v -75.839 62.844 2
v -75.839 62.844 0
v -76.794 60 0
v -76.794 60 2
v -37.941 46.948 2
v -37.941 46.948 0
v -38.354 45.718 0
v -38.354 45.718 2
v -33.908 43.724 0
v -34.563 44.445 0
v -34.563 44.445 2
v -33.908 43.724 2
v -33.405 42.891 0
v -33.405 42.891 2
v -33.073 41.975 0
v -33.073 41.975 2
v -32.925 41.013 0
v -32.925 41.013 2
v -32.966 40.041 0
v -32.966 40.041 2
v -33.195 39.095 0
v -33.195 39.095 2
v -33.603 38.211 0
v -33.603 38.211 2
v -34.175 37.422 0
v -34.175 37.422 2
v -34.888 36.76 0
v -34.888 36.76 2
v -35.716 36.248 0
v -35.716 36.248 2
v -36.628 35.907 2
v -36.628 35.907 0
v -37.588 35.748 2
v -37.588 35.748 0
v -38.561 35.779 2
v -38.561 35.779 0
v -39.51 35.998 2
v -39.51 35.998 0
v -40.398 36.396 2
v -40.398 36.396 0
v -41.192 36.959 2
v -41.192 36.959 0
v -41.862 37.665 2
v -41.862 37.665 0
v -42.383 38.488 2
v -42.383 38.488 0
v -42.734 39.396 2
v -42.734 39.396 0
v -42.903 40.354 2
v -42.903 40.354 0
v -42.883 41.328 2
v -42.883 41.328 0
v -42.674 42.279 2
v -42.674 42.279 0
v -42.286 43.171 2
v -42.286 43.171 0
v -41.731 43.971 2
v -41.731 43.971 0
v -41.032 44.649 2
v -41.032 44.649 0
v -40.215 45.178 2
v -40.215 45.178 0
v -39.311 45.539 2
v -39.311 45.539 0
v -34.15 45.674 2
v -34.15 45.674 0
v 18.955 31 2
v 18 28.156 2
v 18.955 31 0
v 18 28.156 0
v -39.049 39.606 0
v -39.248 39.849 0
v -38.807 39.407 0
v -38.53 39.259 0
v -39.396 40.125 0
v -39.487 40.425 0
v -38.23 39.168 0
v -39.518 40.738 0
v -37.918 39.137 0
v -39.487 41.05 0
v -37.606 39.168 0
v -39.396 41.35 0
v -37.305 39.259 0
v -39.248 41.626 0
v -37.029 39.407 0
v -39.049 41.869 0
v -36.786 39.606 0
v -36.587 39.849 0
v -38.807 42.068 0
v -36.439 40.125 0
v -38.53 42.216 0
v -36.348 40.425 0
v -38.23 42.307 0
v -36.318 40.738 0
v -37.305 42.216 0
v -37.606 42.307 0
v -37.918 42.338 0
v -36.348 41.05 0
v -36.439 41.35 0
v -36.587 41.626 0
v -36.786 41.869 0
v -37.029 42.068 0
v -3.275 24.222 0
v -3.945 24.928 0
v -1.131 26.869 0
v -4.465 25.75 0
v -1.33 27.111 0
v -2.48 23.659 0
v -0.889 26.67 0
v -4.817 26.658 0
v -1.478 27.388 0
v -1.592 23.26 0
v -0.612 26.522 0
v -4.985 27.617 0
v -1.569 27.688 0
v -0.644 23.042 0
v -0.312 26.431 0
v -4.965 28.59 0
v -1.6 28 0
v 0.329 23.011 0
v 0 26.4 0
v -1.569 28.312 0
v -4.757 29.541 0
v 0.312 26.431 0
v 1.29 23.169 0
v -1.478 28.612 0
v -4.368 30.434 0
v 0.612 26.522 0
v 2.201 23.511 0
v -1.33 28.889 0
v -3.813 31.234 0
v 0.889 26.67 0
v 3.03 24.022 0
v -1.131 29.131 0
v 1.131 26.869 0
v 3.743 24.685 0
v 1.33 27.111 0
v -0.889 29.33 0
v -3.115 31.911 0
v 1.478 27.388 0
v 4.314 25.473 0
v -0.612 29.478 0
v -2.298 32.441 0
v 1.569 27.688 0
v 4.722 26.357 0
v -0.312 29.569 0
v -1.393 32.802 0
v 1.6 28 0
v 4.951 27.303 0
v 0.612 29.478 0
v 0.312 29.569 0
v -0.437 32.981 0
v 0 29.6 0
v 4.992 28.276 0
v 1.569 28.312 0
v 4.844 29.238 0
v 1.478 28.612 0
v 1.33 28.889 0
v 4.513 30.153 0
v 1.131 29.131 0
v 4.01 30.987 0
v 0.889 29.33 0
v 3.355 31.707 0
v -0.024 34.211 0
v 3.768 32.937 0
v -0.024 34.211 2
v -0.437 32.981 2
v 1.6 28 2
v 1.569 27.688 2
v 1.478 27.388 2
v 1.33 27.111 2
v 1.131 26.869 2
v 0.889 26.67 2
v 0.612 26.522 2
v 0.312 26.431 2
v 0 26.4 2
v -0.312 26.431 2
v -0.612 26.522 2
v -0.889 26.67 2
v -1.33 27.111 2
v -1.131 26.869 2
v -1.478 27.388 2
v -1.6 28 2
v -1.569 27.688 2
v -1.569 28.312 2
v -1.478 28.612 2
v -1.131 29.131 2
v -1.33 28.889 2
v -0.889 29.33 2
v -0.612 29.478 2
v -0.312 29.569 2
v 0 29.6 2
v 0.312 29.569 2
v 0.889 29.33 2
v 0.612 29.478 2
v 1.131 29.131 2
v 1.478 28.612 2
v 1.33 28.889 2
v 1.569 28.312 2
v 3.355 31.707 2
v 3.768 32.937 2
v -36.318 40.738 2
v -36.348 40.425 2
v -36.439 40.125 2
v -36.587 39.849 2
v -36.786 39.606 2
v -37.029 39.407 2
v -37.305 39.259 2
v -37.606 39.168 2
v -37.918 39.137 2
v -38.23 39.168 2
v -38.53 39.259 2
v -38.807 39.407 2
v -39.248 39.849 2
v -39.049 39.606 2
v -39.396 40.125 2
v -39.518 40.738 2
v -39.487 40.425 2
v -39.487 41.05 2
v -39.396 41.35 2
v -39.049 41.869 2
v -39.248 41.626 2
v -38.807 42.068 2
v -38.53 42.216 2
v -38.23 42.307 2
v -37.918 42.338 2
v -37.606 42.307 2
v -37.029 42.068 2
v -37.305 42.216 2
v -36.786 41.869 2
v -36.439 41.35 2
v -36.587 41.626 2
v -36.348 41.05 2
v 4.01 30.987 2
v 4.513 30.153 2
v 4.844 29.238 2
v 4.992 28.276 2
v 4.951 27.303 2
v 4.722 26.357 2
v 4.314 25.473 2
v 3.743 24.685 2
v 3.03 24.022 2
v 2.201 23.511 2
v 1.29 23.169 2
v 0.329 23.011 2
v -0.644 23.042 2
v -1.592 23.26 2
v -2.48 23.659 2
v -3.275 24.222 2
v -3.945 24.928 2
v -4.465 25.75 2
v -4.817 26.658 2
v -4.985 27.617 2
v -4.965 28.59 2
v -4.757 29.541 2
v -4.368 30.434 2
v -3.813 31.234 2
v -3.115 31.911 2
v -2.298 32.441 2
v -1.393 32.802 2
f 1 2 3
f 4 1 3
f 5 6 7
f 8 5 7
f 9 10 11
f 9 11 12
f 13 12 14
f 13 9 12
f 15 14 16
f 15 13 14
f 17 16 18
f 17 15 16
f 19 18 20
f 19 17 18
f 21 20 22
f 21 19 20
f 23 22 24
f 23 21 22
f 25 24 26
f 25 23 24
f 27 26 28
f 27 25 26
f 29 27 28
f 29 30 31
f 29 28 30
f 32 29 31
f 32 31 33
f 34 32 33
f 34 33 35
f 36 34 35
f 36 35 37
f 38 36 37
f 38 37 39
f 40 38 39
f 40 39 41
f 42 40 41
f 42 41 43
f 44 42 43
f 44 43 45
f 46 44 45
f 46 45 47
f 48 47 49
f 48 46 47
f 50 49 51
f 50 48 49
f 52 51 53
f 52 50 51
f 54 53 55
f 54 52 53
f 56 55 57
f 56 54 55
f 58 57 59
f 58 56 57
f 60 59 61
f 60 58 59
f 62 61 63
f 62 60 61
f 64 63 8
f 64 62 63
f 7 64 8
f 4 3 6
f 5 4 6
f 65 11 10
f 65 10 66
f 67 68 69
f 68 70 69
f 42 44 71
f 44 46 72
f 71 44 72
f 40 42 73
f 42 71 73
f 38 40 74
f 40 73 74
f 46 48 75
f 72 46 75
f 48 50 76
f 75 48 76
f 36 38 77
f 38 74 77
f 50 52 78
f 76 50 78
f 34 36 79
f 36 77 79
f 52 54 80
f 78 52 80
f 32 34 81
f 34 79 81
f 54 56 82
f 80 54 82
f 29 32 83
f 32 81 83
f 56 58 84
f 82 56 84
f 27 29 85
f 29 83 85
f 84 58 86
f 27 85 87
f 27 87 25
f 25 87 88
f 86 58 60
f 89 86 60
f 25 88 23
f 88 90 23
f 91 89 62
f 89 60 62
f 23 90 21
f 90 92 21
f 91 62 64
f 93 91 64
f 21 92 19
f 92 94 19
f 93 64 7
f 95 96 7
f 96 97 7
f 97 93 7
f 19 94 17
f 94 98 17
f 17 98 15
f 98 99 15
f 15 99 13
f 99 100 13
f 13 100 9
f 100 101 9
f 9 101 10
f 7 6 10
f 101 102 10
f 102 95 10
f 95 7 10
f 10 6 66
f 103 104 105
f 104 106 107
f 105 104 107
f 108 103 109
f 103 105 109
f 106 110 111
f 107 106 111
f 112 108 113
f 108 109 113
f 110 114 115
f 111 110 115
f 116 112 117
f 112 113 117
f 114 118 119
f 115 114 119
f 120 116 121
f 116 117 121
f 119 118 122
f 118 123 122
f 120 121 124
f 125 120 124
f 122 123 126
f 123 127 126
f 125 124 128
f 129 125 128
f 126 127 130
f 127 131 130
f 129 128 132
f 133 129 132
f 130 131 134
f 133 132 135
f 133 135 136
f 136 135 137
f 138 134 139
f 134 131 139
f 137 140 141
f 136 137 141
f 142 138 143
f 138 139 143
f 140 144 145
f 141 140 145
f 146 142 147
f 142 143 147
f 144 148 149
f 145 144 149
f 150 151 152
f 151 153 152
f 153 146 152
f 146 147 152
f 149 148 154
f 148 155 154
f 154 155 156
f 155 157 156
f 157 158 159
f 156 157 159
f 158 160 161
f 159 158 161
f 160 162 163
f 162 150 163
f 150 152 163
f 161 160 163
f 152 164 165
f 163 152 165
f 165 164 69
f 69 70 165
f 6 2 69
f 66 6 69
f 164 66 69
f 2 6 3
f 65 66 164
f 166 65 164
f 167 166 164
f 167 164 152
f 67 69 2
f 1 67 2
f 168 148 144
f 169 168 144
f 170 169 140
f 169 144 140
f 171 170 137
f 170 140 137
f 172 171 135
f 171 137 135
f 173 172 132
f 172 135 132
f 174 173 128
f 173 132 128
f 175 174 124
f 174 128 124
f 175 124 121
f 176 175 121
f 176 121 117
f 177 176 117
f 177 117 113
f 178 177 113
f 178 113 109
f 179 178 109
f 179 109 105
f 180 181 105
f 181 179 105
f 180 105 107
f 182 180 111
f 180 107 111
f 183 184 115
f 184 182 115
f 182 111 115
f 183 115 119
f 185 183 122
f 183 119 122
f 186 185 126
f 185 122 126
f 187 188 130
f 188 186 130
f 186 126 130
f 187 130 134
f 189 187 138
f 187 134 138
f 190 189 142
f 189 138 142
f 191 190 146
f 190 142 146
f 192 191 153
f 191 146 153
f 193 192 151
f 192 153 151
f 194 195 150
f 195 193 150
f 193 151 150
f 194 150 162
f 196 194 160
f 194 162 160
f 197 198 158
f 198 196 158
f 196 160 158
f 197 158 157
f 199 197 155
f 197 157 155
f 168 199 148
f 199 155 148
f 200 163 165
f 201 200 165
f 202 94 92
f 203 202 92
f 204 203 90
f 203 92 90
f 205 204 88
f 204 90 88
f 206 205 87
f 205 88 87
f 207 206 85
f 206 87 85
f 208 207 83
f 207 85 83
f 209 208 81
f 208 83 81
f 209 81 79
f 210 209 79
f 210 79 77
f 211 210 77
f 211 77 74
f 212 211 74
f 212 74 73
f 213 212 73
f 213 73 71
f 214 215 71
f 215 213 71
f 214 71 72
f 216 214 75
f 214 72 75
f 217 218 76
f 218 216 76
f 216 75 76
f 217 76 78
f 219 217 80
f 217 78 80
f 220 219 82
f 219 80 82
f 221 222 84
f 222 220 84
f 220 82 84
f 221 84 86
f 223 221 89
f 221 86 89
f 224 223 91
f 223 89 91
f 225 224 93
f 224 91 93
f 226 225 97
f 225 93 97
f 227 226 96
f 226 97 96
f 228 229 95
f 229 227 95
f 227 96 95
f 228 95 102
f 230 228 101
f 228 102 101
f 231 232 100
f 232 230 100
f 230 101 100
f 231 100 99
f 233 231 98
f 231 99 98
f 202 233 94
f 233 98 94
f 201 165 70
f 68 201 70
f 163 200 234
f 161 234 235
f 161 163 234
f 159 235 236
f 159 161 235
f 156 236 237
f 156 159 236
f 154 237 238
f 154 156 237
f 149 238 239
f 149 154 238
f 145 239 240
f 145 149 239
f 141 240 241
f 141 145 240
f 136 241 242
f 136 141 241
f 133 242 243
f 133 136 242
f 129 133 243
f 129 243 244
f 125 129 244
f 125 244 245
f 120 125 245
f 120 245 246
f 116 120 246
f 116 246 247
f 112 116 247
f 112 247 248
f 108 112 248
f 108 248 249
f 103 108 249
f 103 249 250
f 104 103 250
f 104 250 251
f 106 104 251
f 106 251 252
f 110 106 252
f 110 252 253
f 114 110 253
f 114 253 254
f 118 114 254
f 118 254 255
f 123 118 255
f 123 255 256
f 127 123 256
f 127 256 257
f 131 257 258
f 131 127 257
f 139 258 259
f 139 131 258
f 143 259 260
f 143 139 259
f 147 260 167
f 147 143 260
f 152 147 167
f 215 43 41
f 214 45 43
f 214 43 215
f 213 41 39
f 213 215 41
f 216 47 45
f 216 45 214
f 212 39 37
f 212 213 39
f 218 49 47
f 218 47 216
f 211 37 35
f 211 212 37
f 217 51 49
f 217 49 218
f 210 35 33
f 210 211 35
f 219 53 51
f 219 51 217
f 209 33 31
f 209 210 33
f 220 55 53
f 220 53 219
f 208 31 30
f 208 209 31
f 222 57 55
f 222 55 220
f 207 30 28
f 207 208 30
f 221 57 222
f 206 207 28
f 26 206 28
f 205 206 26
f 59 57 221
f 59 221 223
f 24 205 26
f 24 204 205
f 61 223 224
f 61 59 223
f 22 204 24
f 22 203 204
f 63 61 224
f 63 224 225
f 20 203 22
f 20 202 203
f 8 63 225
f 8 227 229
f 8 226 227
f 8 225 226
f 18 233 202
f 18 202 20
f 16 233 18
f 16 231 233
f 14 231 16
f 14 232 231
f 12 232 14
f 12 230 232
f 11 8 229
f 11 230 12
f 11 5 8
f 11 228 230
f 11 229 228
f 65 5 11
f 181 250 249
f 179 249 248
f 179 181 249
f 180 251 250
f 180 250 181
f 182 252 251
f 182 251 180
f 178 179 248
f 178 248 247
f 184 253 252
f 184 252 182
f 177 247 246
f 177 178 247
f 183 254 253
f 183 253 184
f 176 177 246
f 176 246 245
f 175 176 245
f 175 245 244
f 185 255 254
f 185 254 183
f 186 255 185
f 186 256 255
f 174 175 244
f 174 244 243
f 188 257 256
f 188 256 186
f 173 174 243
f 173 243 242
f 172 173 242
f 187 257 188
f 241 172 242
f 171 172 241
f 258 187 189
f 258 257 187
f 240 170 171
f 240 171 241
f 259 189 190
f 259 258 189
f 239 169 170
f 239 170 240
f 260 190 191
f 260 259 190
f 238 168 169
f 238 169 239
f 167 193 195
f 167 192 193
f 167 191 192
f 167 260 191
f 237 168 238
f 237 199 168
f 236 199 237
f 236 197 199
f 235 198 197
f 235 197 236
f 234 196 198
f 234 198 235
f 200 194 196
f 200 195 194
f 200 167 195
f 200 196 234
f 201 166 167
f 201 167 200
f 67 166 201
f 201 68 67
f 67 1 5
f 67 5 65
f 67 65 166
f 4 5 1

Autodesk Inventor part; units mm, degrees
ref_plane "YZ Plane" through (0, 0, 0) normal (1, 0, 0) x (0, 1, 0)
ref_plane "XZ Plane" through (0, 0, 0) normal (0, 1, 0) x (-1, 0, 0)
ref_plane "XY Plane" through (0, 0, 0) normal (0, 0, 1) x (1, 0, 0)
ref_plane "Work Plane1" through (0, 0, 0) normal (0, 0, 1) x (1, 0, 0)
sketch "Sketch1" plane through (0, 0, 0) normal (0, 0, 1) x (1, 0, 0)
  circle A0 centre (0, 28) radius 1.6 projected
  arc A1 (3.5119, -2.971) -> (3.88, 2.471) centre (0, 0) ccw projected
  arc A2 (4.2226, 26.7696) -> (3.88, 2.471) centre (48.0455, 14) ccw projected
  arc A3 (4.2226, 26.7696) -> (-4.2226, 26.7696) centre (0, 28) ccw projected
  arc A4 (-3.88, 2.471) -> (-4.2226, 26.7696) centre (-48.0455, 14) ccw projected
  arc A5 (-3.88, 2.471) -> (-3.5119, -2.971) centre (0, 0) ccw projected
  arc A6 (-3.9828, -12.5413) -> (-3.5119, -2.971) centre (-19.1125, -7) ccw projected
  arc A7 (-3.9828, -12.5413) -> (3.9828, -12.5413) centre (0, -14) ccw projected
  arc A8 (3.5119, -2.971) -> (3.9828, -12.5413) centre (19.1125, -7) ccw projected
  circle A9 centre (0, 0) radius 1.6 projected
  circle A10 centre (0, 21) radius 1.6 projected
  circle A11 centre (0, 28) radius 1.6 projected
  circle A12 centre (0, 14) radius 1.6 projected
  circle A13 centre (0, 7) radius 1.6 projected
  circle A14 centre (0, -7) radius 1.6 projected
  circle A15 centre (0, -14) radius 1.6 projected
  circle A16 centre (0, 28) radius 5
  line L0 (18, 28.1562) -> (18.9553, 31)
  line L1 (18.9553, 31) -> (-75.839, 62.8438)
  line L2 (-75.839, 62.8438) -> (-76.7944, 60)
  line L3 (-76.7944, 60) -> (18, 28.1562)
  line L4 (3.7683, 32.937) -> (-0.0235, 34.2107)
  line L5 (-0.0235, 34.2107) -> (-0.4366, 32.9809)
  line L6 (-0.4366, 32.9809) -> (3.3552, 31.7071)
  line L7 (3.3552, 31.7071) -> (3.7683, 32.937)
  line L8 (9.4559, 31.0263) -> (9.0428, 29.7965)
  circle A17 centre (9.4794, 24.8156) radius 5
  line L9 (9.0428, 29.7965) -> (12.8346, 28.5228)
  line L10 (12.8346, 28.5228) -> (13.2477, 29.7526)
  line L11 (-9.5029, 37.3951) -> (-9.9161, 36.1653)
  circle A18 centre (-9.4794, 31.1844) radius 5
  line L12 (-9.9161, 36.1653) -> (-6.1243, 34.8915)
  line L13 (-6.1243, 34.8915) -> (-5.7112, 36.1213)
  line L14 (-0.0235, 34.2107) -> (-0.4366, 32.9809)
  circle A19 centre (0, 28) radius 5
  line L15 (-0.4366, 32.9809) -> (3.3552, 31.7071)
  line L16 (3.3552, 31.7071) -> (3.7683, 32.937)
  line L17 (-18.9824, 40.5795) -> (-19.3955, 39.3497)
  circle A20 centre (-18.9589, 34.3688) radius 5
  line L18 (-19.3955, 39.3497) -> (-15.6037, 38.0759)
  line L19 (-15.6037, 38.0759) -> (-15.1906, 39.3057)
  line L20 (-9.5029, 37.3951) -> (-9.9161, 36.1653)
  circle A21 centre (-9.4794, 31.1844) radius 5
  line L21 (-9.9161, 36.1653) -> (-6.1243, 34.8915)
  line L22 (-6.1243, 34.8915) -> (-5.7112, 36.1213)
  line L23 (-28.4618, 43.7639) -> (-28.8749, 42.534)
  circle A22 centre (-28.4383, 37.5531) radius 5
  line L24 (-28.8749, 42.534) -> (-25.0832, 41.2603)
  line L25 (-25.0832, 41.2603) -> (-24.67, 42.4901)
  line L26 (-18.9824, 40.5795) -> (-19.3955, 39.3497)
  circle A23 centre (-18.9589, 34.3688) radius 5
  line L27 (-19.3955, 39.3497) -> (-15.6037, 38.0759)
  line L28 (-15.6037, 38.0759) -> (-15.1906, 39.3057)
  line L29 (-37.9412, 46.9483) -> (-38.3544, 45.7184)
  circle A24 centre (-37.9177, 40.7375) radius 5
  line L30 (-38.3544, 45.7184) -> (-34.5626, 44.4447)
  line L31 (-34.5626, 44.4447) -> (-34.1495, 45.6745)
  line L32 (-28.4618, 43.7639) -> (-28.8749, 42.534)
  circle A25 centre (-28.4383, 37.5531) radius 5
  line L33 (-28.8749, 42.534) -> (-25.0832, 41.2603)
  line L34 (-25.0832, 41.2603) -> (-24.67, 42.4901)
  line L35 (-47.4207, 50.1326) -> (-47.8338, 48.9028)
  circle A26 centre (-47.3972, 43.9219) radius 5
  line L36 (-47.8338, 48.9028) -> (-44.042, 47.6291)
  line L37 (-44.042, 47.6291) -> (-43.6289, 48.8589)
  line L38 (-37.9412, 46.9483) -> (-38.3544, 45.7184)
  circle A27 centre (-37.9177, 40.7375) radius 5
  line L39 (-38.3544, 45.7184) -> (-34.5626, 44.4447)
  line L40 (-34.5626, 44.4447) -> (-34.1495, 45.6745)
  line L41 (-56.9001, 53.317) -> (-57.3132, 52.0872)
  circle A28 centre (-56.8766, 47.1063) radius 5
  line L42 (-57.3132, 52.0872) -> (-53.5215, 50.8134)
  line L43 (-53.5215, 50.8134) -> (-53.1083, 52.0433)
  line L44 (-47.4207, 50.1326) -> (-47.8338, 48.9028)
  circle A29 centre (-47.3972, 43.9219) radius 5
  line L45 (-47.8338, 48.9028) -> (-44.042, 47.6291)
  line L46 (-44.042, 47.6291) -> (-43.6289, 48.8589)
  line L47 (-66.3795, 56.5014) -> (-66.7927, 55.2716)
  circle A30 centre (-66.3561, 50.2907) radius 5
  line L48 (-66.7927, 55.2716) -> (-63.0009, 53.9978)
  line L49 (-63.0009, 53.9978) -> (-62.5878, 55.2276)
  line L50 (-56.9001, 53.317) -> (-57.3132, 52.0872)
  circle A31 centre (-56.8766, 47.1063) radius 5
  line L51 (-57.3132, 52.0872) -> (-53.5215, 50.8134)
  line L52 (-53.5215, 50.8134) -> (-53.1083, 52.0433)
  line L53 (-75.859, 59.6858) -> (-76.2721, 58.456)
  circle A32 centre (-75.8355, 53.4751) radius 5
  line L54 (-76.2721, 58.456) -> (-72.4803, 57.1822)
  line L55 (-72.4803, 57.1822) -> (-72.0672, 58.412)
  line L56 (-66.3795, 56.5014) -> (-66.7927, 55.2716)
  circle A33 centre (-66.3561, 50.2907) radius 5
  line L57 (-66.7927, 55.2716) -> (-63.0009, 53.9978)
  line L58 (-63.0009, 53.9978) -> (-62.5878, 55.2276)
  circle A34 centre (0, 28) radius 1.6
  circle A35 centre (-9.4794, 31.1844) radius 1.6
  circle A36 centre (-18.9589, 34.3688) radius 1.6
  circle A37 centre (-28.4383, 37.5531) radius 1.6
  circle A38 centre (-37.9177, 40.7375) radius 1.6
  circle A39 centre (-47.3972, 43.9219) radius 1.6
  circle A40 centre (-56.8766, 47.1063) radius 1.6
  circle A41 centre (-66.3561, 50.2907) radius 1.6
  circle A42 centre (-75.8355, 53.4751) radius 1.6
  circle A43 centre (9.4794, 24.8156) radius 1.6
  circle A44 centre (0, 28) radius 1.6
  circle A45 centre (-9.4794, 31.1844) radius 1.6
  circle A46 centre (-18.9589, 34.3688) radius 1.6
  circle A47 centre (-28.4383, 37.5531) radius 1.6
  circle A48 centre (-37.9177, 40.7375) radius 1.6
  circle A49 centre (-47.3972, 43.9219) radius 1.6
  circle A50 centre (-56.8766, 47.1063) radius 1.6
  circle A51 centre (-66.3561, 50.2907) radius 1.6
  dimension "d0" = 10
  dimension "d1" = 18
  dimension "d2" = 3
  dimension "d3" = 3
  dimension "d4" = 100
  dimension "d5" = 32
  dimension "d6" = 4
  dimension "d11" = 10
  dimension "d14" = 10
  dimension "d19" = 10
  dimension "d22" = 10
extrude "Extrusion1" add sketch "Sketch1" along normal blind 2 contours A16 A4 A3 A2 | A2 A3 A4 A16 L6 | L5 L3 L7 A16 | A16 L6 | L3 L2 L1 L0 | A24 L30 | L29 L3 L31 A24 | A24 L30
properties part number "leaf-lid"
